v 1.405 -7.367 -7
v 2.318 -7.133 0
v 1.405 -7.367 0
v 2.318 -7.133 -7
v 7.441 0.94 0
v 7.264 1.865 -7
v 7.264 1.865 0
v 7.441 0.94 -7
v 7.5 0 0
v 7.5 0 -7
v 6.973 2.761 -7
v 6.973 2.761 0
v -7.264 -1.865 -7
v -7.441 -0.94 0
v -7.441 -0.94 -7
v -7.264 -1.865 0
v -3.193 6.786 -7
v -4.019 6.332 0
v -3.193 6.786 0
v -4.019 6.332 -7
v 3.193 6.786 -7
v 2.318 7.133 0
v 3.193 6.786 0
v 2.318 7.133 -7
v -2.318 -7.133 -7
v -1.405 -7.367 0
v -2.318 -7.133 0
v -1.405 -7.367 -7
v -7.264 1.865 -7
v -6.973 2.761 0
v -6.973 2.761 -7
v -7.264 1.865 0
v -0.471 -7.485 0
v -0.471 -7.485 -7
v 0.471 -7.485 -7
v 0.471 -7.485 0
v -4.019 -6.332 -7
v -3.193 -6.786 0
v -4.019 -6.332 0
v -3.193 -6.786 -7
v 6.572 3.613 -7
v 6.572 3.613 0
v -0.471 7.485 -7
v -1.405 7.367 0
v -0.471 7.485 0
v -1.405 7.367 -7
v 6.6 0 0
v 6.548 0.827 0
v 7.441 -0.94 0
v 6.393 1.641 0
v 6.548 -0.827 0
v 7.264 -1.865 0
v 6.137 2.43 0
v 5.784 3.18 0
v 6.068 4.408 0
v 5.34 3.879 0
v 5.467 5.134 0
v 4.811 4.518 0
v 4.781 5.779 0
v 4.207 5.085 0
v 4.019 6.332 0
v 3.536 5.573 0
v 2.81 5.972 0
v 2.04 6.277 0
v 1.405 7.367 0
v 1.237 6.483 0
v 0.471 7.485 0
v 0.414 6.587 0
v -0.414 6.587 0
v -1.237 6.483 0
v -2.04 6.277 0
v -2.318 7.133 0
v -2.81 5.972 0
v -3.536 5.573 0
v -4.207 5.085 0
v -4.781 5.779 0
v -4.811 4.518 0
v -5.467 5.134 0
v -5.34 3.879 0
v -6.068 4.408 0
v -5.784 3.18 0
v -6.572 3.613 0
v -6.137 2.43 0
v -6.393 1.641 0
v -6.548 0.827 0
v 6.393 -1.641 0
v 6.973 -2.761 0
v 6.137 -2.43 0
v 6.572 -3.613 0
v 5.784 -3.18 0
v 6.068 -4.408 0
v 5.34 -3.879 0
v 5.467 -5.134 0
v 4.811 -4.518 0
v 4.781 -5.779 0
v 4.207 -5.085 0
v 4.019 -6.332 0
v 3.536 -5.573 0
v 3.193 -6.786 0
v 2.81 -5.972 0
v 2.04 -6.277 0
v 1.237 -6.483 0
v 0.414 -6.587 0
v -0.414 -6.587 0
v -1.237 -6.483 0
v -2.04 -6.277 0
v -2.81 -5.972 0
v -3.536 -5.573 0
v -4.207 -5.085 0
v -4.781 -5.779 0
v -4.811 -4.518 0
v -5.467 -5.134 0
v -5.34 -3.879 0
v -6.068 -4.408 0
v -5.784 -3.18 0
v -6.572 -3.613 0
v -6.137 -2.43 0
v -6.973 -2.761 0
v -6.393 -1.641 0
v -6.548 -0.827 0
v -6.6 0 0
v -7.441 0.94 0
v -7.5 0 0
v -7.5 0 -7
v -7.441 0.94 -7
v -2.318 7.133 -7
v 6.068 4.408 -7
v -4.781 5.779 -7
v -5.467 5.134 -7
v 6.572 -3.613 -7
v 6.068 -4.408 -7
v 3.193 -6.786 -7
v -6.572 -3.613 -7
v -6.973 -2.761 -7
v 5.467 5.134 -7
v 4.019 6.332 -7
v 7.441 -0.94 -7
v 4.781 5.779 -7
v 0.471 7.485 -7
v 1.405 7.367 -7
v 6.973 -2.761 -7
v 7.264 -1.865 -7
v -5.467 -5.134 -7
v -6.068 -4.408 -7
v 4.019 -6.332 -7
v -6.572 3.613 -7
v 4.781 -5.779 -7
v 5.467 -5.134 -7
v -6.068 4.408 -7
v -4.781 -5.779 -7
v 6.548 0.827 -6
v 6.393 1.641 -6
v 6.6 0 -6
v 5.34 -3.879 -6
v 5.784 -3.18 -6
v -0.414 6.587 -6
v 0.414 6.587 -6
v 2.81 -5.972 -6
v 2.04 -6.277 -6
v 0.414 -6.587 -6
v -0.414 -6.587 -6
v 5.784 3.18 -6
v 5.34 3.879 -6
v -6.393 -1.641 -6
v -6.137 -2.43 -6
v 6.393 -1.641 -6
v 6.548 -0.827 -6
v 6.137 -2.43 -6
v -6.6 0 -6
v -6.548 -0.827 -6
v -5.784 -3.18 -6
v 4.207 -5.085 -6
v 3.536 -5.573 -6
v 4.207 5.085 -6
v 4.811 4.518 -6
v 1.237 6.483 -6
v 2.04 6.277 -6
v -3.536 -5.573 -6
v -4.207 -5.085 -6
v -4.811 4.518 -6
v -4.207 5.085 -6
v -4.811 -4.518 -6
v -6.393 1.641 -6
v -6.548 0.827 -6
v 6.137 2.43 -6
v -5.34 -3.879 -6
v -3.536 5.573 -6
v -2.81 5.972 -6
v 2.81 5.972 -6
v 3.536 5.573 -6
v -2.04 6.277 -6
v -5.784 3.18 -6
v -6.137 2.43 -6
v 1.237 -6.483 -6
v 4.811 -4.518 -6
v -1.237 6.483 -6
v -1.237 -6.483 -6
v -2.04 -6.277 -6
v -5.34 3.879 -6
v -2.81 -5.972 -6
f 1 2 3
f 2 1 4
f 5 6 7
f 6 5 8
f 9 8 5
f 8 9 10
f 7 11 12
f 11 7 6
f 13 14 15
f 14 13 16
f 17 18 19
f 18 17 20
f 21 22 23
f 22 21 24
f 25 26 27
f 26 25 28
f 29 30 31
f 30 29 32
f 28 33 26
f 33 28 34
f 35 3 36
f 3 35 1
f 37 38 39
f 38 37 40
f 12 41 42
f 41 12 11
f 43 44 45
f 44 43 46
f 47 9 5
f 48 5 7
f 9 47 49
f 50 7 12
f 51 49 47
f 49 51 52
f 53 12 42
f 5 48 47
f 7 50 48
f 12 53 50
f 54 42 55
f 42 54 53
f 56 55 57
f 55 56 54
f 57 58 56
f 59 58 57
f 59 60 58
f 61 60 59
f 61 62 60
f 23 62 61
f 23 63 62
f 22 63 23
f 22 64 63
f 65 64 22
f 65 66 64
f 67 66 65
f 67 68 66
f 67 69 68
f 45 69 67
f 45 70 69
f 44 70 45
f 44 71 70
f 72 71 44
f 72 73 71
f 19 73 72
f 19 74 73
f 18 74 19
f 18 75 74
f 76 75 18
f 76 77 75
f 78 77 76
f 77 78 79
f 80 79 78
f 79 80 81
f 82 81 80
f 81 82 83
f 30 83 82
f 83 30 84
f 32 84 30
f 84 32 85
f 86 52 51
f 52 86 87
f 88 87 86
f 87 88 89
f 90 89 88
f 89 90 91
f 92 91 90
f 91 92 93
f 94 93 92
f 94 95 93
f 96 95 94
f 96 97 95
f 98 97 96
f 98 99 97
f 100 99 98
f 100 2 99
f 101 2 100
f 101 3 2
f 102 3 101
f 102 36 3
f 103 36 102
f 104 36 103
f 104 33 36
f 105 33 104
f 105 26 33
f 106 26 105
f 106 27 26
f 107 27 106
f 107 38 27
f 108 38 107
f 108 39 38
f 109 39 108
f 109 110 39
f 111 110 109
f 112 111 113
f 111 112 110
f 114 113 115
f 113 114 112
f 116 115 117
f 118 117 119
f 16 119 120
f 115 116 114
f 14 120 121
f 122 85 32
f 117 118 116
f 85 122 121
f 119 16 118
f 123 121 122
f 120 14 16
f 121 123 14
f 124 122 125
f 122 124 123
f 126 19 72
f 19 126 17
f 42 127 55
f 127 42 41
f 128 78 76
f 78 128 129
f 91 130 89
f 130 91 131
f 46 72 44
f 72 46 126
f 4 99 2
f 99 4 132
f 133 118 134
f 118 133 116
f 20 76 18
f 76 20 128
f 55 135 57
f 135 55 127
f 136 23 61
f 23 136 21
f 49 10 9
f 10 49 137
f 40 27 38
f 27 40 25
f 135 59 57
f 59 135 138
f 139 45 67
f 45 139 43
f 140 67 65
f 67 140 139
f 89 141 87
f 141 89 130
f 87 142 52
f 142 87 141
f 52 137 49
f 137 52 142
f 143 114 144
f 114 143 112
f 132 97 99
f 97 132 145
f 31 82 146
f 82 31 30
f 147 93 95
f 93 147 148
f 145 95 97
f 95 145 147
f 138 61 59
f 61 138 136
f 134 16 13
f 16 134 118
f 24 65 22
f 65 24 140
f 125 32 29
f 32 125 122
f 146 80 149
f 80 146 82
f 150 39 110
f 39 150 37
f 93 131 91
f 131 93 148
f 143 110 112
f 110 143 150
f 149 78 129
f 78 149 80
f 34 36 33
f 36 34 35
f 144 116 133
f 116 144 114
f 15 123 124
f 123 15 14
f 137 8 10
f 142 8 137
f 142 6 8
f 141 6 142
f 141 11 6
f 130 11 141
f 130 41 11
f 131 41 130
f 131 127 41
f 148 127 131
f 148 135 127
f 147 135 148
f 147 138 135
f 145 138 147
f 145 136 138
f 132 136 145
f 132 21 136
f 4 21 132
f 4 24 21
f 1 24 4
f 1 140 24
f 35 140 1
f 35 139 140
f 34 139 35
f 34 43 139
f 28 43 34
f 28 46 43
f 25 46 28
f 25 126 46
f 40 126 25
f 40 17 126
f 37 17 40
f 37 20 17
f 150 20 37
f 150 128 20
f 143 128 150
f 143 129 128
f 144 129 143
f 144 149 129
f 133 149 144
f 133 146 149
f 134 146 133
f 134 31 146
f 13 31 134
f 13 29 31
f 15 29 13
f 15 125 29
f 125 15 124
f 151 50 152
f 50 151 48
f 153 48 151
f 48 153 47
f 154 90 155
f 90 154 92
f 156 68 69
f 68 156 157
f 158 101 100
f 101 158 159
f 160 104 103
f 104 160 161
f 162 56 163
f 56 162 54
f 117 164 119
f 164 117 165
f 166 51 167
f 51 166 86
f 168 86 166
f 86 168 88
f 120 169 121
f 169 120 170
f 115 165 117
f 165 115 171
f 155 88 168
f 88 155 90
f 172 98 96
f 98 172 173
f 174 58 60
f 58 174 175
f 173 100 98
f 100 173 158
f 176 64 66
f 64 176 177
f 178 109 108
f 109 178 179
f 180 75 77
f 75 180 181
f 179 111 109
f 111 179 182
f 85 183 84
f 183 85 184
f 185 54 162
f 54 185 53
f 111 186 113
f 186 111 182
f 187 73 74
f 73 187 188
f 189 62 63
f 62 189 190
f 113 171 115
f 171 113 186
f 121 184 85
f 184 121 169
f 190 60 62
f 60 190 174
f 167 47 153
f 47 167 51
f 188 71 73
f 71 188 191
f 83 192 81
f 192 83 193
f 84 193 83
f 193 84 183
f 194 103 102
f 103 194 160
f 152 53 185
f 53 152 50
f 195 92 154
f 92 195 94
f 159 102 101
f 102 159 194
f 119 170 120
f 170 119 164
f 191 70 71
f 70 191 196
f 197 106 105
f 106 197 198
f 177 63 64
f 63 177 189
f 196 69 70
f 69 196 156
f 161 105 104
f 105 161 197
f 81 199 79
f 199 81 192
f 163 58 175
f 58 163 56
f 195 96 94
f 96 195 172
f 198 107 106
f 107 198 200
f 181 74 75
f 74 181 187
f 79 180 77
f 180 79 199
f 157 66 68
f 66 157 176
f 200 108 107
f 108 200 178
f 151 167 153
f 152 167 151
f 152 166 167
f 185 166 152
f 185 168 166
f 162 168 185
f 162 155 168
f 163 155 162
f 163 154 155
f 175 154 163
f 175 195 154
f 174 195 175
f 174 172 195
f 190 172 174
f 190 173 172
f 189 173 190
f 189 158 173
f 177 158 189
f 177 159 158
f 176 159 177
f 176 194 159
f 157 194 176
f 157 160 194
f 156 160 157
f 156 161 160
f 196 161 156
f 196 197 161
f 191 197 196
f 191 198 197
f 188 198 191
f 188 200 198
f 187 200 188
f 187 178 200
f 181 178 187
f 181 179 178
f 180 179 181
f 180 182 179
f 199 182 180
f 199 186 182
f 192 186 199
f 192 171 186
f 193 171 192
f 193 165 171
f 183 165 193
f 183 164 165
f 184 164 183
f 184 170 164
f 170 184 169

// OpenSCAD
$fn = 50;


difference() {
	union() {
		translate(v = [0, 0, -7.0000000000]) {
			cylinder(h = 7, r = 7.5000000000);
		}
	}
	union() {
		#translate(v = [0, 0, -6.0000000000]) {
			cylinder(h = 6, r = 6.6000000000);
		}
	}
}
